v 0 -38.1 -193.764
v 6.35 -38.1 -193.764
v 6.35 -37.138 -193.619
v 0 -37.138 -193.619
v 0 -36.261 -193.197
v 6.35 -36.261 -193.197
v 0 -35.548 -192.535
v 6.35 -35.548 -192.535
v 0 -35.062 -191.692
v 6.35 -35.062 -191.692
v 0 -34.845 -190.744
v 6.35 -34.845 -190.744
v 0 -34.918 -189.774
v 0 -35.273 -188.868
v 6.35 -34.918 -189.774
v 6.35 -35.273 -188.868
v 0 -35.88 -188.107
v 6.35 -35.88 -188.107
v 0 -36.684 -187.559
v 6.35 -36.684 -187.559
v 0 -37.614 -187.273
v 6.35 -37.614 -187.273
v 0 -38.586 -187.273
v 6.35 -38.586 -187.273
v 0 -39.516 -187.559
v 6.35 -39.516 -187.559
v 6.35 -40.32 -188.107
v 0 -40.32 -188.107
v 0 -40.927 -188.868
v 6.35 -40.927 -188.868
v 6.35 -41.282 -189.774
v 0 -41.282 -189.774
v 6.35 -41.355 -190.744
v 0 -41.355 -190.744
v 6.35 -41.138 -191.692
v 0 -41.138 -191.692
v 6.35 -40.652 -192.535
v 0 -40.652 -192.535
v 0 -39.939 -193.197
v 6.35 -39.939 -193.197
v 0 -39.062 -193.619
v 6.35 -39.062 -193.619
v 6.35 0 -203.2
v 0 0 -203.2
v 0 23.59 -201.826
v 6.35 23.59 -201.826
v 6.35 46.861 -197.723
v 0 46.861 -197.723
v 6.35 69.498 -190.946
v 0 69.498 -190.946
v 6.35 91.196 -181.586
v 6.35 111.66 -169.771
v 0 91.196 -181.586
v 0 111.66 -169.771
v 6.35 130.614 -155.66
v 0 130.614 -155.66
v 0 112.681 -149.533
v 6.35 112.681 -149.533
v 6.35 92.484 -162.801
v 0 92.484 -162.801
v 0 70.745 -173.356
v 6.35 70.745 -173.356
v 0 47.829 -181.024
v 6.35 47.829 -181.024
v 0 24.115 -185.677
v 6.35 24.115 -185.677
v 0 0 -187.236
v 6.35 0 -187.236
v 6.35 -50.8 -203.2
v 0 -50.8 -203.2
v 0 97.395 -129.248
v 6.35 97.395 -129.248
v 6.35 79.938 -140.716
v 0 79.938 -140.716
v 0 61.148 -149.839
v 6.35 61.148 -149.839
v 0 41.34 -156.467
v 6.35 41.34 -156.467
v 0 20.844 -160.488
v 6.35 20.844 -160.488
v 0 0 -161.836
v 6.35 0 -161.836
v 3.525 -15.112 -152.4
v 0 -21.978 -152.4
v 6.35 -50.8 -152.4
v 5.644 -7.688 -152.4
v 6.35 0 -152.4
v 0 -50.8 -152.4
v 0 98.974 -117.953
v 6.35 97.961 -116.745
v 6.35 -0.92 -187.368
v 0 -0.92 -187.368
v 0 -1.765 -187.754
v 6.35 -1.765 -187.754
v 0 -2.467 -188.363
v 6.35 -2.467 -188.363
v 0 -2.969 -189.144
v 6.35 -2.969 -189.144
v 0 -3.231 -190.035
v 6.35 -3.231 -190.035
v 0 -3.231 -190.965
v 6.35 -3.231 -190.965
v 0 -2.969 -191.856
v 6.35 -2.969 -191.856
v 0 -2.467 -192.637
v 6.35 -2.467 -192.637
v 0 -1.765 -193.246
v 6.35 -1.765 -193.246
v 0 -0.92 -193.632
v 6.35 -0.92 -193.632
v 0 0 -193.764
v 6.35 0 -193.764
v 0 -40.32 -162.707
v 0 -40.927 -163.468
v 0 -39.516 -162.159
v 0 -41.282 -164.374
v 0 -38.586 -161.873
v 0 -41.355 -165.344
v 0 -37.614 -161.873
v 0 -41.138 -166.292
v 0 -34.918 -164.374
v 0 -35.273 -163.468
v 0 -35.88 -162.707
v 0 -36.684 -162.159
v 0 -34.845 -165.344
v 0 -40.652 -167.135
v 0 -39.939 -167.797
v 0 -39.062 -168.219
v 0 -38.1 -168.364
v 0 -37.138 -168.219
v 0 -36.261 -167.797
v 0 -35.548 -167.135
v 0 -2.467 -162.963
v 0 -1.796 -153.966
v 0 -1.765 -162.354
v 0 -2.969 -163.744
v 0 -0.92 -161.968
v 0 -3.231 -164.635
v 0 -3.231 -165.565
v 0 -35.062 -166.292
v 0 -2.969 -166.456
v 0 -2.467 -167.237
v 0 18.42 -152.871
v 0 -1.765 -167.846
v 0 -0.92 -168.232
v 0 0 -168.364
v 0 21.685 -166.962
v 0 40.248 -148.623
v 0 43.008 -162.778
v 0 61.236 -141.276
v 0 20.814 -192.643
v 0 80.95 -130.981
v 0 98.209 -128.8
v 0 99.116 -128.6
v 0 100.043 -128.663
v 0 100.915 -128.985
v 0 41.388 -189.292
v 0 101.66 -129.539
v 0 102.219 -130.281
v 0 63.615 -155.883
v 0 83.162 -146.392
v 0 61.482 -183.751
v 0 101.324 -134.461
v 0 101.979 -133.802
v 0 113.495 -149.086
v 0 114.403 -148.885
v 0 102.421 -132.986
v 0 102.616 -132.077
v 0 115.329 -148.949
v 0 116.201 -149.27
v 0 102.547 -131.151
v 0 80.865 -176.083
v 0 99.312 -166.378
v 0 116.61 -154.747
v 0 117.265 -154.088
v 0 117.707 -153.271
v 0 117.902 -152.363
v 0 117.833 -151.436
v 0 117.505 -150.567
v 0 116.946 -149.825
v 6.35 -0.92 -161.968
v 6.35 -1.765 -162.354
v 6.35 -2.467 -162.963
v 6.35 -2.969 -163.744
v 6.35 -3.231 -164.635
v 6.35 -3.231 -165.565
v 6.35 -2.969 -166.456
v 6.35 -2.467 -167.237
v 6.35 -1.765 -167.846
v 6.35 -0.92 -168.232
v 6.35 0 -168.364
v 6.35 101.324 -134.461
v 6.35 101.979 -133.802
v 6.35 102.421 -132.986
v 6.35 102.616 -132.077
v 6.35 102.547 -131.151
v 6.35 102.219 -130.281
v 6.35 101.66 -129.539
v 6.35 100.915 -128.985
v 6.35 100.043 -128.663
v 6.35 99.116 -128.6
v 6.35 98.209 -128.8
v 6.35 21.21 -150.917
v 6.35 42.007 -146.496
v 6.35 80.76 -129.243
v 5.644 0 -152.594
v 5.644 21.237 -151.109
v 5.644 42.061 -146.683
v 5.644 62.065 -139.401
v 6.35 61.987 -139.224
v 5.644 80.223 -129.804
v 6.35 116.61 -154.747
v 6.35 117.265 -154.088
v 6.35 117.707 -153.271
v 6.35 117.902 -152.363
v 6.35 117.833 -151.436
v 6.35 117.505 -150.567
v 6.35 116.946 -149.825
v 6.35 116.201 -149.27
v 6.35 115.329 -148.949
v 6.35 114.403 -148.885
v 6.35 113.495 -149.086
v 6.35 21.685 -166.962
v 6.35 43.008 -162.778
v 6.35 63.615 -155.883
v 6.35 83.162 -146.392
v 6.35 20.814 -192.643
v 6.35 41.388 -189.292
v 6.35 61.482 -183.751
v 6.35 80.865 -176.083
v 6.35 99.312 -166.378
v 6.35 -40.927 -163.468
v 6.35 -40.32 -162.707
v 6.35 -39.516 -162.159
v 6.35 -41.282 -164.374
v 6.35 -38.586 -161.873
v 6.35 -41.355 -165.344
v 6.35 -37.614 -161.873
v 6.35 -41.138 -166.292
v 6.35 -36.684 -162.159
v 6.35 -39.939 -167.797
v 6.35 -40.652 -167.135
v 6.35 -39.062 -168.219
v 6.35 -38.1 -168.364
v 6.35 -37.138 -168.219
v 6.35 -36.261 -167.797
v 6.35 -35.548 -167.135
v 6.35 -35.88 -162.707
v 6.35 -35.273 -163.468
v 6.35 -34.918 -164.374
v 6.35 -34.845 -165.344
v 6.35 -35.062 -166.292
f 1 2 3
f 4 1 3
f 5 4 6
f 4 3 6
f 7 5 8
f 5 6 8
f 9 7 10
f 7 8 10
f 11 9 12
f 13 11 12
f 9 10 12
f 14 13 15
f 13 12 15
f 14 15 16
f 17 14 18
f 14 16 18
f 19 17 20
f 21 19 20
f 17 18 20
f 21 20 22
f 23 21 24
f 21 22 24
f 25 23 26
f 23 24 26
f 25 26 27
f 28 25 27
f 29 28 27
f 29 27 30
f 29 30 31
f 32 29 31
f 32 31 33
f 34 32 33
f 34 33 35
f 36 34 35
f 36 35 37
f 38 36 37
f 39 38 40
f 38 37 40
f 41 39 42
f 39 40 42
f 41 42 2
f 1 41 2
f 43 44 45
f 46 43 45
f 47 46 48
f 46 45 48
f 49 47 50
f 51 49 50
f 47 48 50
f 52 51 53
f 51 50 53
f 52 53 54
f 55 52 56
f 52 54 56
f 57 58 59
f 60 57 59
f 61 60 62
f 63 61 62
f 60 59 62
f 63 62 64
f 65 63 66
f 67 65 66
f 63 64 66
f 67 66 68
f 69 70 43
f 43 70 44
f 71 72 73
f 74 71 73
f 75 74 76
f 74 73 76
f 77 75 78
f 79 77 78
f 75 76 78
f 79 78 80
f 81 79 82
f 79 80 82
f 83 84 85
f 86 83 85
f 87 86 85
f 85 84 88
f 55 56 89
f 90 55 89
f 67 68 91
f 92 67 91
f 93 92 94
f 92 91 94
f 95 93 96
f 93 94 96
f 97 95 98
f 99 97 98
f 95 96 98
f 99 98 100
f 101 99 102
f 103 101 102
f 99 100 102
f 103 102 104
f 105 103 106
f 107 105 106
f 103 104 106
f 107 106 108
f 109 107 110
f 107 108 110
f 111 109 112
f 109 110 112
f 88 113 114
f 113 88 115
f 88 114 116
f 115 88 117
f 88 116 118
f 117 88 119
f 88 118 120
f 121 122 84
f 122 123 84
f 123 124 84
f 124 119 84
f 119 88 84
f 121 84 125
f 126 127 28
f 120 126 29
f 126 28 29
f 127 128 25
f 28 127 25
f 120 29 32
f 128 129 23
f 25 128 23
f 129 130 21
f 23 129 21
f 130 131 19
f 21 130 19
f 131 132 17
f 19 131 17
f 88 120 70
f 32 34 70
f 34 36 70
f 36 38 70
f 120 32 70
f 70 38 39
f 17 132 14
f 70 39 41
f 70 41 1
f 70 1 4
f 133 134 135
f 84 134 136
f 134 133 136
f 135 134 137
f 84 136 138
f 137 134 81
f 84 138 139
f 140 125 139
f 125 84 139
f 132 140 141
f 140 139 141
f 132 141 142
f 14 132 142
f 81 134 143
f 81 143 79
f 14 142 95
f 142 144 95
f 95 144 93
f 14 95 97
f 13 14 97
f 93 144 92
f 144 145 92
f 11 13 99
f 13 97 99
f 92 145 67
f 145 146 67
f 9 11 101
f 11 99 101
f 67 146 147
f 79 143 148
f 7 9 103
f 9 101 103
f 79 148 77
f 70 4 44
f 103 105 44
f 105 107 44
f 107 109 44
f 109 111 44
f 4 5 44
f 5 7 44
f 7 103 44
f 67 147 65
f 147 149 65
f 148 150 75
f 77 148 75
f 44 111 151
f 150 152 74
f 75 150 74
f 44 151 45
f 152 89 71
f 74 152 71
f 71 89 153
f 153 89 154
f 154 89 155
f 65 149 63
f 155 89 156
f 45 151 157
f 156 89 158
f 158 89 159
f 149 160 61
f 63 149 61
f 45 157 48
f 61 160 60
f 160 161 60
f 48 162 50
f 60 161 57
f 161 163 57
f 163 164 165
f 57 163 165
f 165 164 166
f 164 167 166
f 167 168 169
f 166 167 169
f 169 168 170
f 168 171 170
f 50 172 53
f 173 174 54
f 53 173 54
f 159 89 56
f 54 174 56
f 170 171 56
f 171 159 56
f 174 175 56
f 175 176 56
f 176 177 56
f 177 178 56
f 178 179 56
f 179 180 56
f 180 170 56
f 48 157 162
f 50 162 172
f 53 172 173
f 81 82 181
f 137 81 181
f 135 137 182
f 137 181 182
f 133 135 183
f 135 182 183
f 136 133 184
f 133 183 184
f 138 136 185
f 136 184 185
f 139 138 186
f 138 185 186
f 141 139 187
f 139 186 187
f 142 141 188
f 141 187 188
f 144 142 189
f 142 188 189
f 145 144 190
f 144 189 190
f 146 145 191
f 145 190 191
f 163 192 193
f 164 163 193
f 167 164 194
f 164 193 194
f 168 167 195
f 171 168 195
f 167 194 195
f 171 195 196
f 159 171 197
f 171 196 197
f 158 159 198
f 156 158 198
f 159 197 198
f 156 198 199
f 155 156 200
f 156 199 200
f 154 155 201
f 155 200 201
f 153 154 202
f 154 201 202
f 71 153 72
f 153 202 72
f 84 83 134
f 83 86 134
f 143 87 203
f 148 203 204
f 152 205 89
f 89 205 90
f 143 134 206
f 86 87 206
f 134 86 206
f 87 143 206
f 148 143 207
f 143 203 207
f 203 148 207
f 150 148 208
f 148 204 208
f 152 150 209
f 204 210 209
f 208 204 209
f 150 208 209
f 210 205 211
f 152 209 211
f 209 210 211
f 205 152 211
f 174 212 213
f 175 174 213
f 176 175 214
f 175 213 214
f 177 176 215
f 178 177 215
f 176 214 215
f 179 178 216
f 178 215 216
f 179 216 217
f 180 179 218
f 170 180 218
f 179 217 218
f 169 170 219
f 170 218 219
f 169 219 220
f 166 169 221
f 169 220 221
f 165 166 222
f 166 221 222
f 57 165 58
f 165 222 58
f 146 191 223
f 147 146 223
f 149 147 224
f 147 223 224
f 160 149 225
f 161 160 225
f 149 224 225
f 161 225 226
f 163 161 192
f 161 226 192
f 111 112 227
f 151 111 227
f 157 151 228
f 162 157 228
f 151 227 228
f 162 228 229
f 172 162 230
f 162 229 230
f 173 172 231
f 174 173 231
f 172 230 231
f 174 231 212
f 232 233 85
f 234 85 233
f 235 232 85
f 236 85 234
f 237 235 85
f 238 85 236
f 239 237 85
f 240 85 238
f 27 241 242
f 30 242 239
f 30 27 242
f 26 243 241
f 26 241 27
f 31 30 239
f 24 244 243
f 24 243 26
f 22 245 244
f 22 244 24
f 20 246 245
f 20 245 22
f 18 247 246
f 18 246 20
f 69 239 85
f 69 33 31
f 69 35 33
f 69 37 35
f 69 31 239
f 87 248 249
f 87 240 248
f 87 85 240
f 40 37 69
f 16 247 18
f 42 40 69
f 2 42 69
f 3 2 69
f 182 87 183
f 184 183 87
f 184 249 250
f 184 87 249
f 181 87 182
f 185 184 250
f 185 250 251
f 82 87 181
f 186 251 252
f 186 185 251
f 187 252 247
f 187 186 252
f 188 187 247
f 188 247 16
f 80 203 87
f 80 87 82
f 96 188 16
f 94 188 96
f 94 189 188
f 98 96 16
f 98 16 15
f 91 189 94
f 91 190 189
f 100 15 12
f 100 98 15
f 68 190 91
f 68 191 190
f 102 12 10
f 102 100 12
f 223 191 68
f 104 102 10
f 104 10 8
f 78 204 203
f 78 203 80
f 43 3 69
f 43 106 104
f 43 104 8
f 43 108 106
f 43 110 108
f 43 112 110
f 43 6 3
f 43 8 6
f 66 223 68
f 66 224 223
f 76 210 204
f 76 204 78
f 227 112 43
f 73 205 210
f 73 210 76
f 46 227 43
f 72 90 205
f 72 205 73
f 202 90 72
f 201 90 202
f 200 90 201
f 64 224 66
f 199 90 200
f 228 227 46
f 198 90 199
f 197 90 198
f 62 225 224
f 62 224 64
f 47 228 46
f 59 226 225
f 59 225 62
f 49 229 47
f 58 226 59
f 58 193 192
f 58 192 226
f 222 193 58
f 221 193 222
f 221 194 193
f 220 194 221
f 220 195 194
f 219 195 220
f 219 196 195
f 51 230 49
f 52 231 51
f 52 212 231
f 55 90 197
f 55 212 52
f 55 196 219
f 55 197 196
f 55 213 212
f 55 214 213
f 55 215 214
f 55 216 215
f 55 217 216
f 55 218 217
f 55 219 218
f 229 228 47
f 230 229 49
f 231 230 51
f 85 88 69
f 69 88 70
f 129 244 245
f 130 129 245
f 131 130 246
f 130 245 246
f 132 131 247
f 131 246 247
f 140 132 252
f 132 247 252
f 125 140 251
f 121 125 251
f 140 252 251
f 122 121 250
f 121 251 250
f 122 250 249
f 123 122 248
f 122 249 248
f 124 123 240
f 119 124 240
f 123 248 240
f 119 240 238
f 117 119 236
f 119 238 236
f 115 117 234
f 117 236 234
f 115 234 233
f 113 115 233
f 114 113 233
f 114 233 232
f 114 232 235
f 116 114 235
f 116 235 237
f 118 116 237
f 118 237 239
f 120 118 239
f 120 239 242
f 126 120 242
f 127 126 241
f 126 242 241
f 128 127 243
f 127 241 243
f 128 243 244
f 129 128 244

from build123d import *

# Parameters (mm, degrees)
BOSS_EXTRUDE1_DEPTH = 6.35
CUT_EXTRUDE4_DEPTH  = 6.35
SKETCH3_R           = 3.2639
CUT_EXTRUDE5_DEPTH  = 6.35


with BuildPart() as part:
    # Sketch1 → Boss-Extrude1 (new body)
    with BuildSketch(Plane(origin=(0, 0, 0), x_dir=(0, 0, -1), z_dir=(1, 0, 0))):
        with BuildLine():
            Line((152.4, 0), (152.4, -50.8))
            Line((152.4, -50.8), (203.2, -50.8))
            Line((203.2, -50.8), (203.2, 0))
            ThreePointArc((203.2, 0), (190.945540544, 69.498493124), (155.660230842, 130.614442288))
            Line((155.660230842, 130.614442288), (116.745173131, 97.960831716))
            ThreePointArc((116.745173131, 97.960831716), (143.209155408, 52.123869843), (152.4, 0))
        make_face()
    extrude(amount=BOSS_EXTRUDE1_DEPTH)

    # Sketch2 → Cut-Extrude4 (cut)
    with BuildSketch(Plane(origin=(6.35, 0, 0), x_dir=(0, 0, -1), z_dir=(1, 0, 0))):
        with BuildLine():
            ThreePointArc((134.46138915, 101.323924376), (129.890458655, 101.966326764), (129.248056268, 97.395396268))
            ThreePointArc((129.248056268, 97.395396268), (153.473001896, 51.351348104), (161.8361, 0))
            ThreePointArc((161.8361, 0), (165.1, -3.2639), (168.3639, 0))
            ThreePointArc((168.3639, 0), (159.663469053, 53.422649441), (134.46138915, 101.323924376))
        make_face()
        with BuildLine():
            ThreePointArc((154.746731105, 116.610025965), (150.17580061, 117.252428352), (149.533398223, 112.681497856))
            ThreePointArc((149.533398223, 112.681497856), (177.560422739, 59.410886377), (187.2361, 0))
            ThreePointArc((187.2361, 0), (190.5, -3.2639), (193.7639, 0))
            ThreePointArc((193.7639, 0), (183.750889895, 61.482187713), (154.746731105, 116.610025965))
        make_face()
    extrude(amount=-CUT_EXTRUDE4_DEPTH, mode=Mode.SUBTRACT)

    # Sketch3 → Cut-Extrude5 (cut)
    with BuildSketch(Plane(origin=(6.35, 0, 0), x_dir=(0, 0, -1), z_dir=(1, 0, 0))):
        with Locations((165.1, -38.1)):
            Circle(SKETCH3_R)
        with Locations((190.5, -38.1)):
            Circle(SKETCH3_R)
    extrude(amount=-CUT_EXTRUDE5_DEPTH, mode=Mode.SUBTRACT)

    # Sketch7 → Cut-Revolve1 (revolve, cut)
    with BuildSketch(Plane(origin=(0, 0, 0), x_dir=(1, 0, 0), z_dir=(0, 1, 0))):
        with BuildLine():
            Line((-25.4, 38.1), (-144.027789746, 38.1))
            ThreePointArc((-144.027789746, 38.1), (-25.4, 156.727789746), (93.227789746, 38.1))
            Line((93.227789746, 38.1), (-25.4, 38.1))
        make_face()
    revolve(axis=Axis((-1000, 0, 0), (1, 0, 0)), mode=Mode.SUBTRACT)


solid = part.part
